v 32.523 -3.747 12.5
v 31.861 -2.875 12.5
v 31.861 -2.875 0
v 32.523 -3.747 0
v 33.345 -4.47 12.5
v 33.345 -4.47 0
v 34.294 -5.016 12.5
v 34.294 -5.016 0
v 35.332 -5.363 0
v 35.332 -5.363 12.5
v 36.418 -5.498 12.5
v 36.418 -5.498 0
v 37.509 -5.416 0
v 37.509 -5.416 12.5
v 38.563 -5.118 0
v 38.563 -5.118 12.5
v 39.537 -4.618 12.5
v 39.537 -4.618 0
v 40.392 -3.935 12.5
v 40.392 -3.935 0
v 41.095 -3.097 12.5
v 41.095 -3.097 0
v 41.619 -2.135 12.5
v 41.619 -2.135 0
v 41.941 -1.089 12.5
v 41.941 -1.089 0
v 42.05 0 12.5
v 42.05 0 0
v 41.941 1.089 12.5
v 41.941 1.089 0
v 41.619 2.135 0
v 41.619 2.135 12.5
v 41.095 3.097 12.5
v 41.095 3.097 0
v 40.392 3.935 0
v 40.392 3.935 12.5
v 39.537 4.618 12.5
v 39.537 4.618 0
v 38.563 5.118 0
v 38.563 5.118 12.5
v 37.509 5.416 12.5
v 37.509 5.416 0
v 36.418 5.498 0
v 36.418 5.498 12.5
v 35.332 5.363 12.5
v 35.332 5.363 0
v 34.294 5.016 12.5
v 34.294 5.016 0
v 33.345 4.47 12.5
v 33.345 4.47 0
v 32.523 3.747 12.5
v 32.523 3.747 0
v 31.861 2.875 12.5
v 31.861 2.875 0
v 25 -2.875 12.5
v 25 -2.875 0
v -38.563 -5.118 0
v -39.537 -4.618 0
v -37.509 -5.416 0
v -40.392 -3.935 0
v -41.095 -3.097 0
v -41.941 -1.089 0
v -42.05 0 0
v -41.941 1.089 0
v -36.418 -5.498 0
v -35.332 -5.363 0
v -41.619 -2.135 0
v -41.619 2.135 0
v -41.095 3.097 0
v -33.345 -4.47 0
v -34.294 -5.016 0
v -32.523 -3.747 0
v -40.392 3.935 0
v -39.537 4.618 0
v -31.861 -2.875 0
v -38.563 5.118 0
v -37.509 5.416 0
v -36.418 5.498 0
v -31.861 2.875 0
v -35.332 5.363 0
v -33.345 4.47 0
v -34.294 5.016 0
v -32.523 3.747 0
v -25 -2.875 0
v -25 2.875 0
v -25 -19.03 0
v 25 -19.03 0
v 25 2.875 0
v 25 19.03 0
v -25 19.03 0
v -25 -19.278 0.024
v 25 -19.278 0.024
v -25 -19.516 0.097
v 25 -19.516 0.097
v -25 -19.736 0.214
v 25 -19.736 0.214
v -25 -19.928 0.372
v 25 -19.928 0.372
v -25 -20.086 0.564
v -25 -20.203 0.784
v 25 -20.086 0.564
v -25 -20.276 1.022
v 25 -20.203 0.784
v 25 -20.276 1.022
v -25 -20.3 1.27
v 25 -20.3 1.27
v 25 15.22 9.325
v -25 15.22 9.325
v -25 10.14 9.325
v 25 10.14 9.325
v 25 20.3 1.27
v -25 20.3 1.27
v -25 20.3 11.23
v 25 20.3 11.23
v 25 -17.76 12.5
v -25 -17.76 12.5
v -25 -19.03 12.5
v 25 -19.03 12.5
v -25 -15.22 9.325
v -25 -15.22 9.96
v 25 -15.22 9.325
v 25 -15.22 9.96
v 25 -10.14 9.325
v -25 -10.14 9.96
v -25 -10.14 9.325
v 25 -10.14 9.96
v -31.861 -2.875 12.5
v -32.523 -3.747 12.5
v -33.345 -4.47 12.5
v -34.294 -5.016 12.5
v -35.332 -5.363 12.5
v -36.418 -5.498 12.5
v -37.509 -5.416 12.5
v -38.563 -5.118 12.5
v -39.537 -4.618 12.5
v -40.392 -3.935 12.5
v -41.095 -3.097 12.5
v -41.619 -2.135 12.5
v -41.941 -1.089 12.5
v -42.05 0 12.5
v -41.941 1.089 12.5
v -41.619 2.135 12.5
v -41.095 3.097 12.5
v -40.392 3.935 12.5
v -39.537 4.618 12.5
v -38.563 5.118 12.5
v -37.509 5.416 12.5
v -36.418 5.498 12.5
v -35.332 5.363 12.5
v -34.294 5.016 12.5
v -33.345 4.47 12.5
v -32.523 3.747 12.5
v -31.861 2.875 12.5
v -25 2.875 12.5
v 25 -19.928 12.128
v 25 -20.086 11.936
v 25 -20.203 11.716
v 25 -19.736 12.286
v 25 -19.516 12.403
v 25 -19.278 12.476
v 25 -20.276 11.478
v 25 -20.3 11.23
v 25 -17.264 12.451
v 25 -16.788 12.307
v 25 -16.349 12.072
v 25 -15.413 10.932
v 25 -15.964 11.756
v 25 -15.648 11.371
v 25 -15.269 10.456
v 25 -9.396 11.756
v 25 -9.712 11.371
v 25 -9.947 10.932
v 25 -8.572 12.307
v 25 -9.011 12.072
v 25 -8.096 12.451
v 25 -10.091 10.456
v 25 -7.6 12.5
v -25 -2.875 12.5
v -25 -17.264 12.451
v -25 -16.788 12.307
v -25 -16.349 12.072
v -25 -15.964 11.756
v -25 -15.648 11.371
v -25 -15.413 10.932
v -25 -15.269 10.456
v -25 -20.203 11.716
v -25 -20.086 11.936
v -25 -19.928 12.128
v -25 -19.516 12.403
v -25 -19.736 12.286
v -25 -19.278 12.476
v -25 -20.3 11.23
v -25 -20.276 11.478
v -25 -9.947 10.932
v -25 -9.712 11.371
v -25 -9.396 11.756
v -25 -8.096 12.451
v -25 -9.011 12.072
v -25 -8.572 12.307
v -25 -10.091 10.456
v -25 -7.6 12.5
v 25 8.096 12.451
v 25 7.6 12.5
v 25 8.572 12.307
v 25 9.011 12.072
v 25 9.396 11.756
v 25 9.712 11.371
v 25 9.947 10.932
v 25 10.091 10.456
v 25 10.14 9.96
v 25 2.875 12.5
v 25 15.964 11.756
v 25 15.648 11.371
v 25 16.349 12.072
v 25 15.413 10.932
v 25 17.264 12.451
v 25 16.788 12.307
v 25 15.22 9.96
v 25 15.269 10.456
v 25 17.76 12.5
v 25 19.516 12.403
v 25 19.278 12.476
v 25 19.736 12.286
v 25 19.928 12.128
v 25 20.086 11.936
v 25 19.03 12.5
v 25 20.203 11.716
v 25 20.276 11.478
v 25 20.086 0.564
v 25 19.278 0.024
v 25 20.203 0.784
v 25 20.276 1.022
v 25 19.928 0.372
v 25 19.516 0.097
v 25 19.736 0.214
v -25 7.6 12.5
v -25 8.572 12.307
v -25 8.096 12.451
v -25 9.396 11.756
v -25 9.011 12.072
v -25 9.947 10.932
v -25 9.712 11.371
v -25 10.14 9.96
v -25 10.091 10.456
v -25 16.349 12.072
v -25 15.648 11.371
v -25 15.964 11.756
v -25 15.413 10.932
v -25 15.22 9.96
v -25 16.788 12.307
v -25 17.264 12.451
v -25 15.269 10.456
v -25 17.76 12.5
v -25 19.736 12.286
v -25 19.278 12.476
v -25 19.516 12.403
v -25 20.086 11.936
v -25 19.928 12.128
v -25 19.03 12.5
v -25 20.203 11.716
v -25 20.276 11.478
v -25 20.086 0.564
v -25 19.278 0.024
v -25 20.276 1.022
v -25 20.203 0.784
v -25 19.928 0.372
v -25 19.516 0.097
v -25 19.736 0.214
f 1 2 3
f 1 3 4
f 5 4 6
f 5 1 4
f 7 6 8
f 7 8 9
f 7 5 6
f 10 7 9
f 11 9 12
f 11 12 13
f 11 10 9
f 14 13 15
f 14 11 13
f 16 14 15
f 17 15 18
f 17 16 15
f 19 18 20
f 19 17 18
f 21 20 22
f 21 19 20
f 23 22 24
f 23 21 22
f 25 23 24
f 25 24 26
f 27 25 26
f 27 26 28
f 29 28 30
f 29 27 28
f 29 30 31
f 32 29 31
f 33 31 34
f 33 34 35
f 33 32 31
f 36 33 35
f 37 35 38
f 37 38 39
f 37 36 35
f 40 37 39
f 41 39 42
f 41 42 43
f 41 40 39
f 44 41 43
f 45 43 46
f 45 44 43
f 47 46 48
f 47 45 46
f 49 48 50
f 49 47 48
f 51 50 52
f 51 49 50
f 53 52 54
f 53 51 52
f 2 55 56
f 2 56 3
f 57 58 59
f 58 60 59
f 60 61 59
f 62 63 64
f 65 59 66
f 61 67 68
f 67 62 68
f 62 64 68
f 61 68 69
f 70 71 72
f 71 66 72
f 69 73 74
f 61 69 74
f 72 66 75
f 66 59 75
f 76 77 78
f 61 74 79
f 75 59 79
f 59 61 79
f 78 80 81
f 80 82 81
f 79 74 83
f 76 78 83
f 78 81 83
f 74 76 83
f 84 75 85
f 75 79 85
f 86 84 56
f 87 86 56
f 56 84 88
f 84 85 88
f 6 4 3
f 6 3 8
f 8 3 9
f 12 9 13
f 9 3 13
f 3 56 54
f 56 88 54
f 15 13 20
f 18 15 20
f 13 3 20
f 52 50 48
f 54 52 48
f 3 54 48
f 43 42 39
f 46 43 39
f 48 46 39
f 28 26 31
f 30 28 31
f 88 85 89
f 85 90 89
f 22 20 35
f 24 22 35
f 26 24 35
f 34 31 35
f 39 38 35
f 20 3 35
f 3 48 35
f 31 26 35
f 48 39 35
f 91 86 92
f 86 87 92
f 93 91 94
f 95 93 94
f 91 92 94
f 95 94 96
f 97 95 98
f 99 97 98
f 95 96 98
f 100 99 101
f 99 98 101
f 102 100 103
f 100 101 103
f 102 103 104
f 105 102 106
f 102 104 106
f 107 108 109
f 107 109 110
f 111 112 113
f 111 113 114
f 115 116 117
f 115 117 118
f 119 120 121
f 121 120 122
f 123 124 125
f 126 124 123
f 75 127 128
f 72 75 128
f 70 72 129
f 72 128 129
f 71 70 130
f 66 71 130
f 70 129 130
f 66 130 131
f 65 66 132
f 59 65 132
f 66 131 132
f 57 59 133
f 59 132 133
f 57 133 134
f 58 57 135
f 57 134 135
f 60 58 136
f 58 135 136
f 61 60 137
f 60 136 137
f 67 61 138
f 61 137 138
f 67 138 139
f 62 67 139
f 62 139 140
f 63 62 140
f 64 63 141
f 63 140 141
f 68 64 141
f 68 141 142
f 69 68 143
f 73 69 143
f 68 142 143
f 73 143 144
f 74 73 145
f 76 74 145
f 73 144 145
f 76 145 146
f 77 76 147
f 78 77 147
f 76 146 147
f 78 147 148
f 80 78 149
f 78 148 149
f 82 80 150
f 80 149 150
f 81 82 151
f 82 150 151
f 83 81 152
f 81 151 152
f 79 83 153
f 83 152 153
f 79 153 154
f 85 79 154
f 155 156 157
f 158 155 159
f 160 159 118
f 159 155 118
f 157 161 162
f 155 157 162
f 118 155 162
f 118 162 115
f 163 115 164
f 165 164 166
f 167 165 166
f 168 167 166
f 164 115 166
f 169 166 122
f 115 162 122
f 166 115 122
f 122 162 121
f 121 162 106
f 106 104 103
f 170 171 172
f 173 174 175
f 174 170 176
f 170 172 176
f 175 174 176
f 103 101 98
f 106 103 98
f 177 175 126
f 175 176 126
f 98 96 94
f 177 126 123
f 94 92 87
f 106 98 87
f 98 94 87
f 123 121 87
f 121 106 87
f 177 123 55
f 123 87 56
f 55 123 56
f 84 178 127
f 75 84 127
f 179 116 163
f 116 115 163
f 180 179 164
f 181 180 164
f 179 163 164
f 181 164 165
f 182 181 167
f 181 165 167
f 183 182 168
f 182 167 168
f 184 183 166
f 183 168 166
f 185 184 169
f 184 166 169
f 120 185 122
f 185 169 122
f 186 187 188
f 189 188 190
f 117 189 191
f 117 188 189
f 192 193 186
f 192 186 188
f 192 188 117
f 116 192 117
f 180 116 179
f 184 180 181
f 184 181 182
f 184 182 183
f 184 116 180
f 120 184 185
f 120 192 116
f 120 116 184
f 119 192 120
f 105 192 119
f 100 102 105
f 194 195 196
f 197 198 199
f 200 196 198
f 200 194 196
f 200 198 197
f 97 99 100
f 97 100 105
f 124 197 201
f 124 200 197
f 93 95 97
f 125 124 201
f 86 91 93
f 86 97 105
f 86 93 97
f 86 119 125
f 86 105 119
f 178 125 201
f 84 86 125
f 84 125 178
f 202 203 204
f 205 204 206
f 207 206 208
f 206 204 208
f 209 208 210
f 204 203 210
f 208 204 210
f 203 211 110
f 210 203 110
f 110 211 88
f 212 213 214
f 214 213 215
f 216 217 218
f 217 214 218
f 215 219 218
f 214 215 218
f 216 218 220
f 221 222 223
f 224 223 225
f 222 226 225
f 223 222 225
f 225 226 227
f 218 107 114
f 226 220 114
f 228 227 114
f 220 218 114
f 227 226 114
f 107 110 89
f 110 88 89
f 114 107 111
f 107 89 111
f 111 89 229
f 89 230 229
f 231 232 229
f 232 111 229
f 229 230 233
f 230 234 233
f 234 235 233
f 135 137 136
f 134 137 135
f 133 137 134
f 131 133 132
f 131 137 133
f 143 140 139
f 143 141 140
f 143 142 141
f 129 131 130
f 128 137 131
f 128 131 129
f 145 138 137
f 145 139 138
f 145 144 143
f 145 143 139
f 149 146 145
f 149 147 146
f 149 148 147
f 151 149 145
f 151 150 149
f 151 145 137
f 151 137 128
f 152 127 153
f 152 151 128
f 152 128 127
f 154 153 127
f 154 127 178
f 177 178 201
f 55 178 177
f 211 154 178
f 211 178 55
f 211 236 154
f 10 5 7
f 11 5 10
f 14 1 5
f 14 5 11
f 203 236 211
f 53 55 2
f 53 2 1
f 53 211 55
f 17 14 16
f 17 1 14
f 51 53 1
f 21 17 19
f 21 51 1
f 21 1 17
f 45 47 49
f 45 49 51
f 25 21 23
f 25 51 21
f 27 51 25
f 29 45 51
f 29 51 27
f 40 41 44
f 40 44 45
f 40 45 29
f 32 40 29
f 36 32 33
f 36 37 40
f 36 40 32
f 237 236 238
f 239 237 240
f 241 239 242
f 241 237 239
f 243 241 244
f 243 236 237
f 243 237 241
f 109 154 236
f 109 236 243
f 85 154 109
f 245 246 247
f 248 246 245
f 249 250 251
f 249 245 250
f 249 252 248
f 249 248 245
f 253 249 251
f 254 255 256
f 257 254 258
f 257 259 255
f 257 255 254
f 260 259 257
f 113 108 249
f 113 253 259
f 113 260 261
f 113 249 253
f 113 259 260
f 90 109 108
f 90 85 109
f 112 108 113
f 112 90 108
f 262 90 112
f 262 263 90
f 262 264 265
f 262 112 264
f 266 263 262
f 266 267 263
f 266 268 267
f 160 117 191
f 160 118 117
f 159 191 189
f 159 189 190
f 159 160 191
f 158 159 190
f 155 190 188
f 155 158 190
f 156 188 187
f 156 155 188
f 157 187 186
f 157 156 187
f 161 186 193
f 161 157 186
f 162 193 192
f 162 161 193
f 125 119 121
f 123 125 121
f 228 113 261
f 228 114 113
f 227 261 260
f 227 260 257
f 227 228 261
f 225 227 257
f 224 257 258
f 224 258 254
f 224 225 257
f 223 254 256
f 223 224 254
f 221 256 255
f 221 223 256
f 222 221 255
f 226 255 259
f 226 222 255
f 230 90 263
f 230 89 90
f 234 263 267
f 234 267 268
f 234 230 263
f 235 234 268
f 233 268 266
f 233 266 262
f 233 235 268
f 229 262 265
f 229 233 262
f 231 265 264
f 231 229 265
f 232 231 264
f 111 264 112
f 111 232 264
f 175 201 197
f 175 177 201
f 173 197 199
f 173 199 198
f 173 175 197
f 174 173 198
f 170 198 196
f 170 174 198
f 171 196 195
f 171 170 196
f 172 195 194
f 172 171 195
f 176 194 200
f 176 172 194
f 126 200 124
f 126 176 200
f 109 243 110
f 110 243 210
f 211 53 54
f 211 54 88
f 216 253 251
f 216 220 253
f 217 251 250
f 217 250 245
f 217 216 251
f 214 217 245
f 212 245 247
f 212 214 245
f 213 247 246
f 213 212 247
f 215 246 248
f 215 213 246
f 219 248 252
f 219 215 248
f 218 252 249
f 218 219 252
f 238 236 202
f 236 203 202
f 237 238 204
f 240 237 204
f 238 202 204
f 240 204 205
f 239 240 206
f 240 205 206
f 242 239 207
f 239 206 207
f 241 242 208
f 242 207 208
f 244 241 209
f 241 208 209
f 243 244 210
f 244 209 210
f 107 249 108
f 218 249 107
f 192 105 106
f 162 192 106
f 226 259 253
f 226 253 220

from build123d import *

# Parameters (mm, degrees)
F0_W     = 50
F0_H     = 40.6
F1_DEPTH = 12.5
F3_DEPTH = 12.5
F4_W     = 50
F4_H     = 5.08
F5_DEPTH = 3.175
F6_R     = 1.27
F7_R     = 2.54


# Not quite as in the source:
# - a pattern or mirror of a feature is missing from the dataset's text; its kind, count and spacing are read off the source's solid
# - a feature names something its author has since deleted; it is built from what else it names


with BuildPart() as f1:
    # F0 (on Top) → F1 (new body)
    with BuildSketch(Plane.XY):
        Rectangle(F0_W, F0_H)
    extrude(amount=F1_DEPTH)

    # F2 (on face) → F3 (join, through all)
    with BuildSketch(Plane.XY.offset(12.5)):
        with BuildLine():
            Line((25, -2.875), (31.8612501666, -2.875))
            ThreePointArc((31.8612501666, -2.875), (42.05, 0), (31.8612501666, 2.875))
            Line((31.8612501666, 2.875), (25, 2.875))
            Line((25, 2.875), (25, 0))
            Line((25, 0), (25, -2.875))
        make_face()
    f3 = extrude(amount=-F3_DEPTH)

    # F3_copies: F3 across plane
    add(f3.mirror(Plane(origin=(0, 0, 0), x_dir=(0, 0, -1), z_dir=(-1, 0, 0))))

    # F4 (on face) → F5 (cut)
    with BuildSketch(Plane.XY.offset(12.5)):
        with Locations((0, 12.68)):
            Rectangle(F4_W, F4_H)
    f5 = extrude(amount=-F5_DEPTH, mode=Mode.SUBTRACT)

    # F5_copies: F5 across plane
    add(f5.mirror(Plane(origin=(0, 0, 0), x_dir=(0, 0, -1), z_dir=(0, -1, 0))), mode=Mode.SUBTRACT)

    # F6
    f6_edges = [f1.edges().sort_by_distance(p)[0] for p in [
        (0, 20.3, 12.5),
        (0, -20.3, 12.5),
        (0, 20.3, 0),
        (0, -20.3, 0),
    ]]
    fillet(f6_edges, radius=F6_R)

    # F7
    f7_edges = [f1.edges().sort_by_distance(p)[0] for p in [
        (0, 15.22, 12.5),
        (0, 10.14, 12.5),
        (0, -10.14, 12.5),
        (0, -15.22, 12.5),
    ]]
    fillet(f7_edges, radius=F7_R)


solid = f1.part
